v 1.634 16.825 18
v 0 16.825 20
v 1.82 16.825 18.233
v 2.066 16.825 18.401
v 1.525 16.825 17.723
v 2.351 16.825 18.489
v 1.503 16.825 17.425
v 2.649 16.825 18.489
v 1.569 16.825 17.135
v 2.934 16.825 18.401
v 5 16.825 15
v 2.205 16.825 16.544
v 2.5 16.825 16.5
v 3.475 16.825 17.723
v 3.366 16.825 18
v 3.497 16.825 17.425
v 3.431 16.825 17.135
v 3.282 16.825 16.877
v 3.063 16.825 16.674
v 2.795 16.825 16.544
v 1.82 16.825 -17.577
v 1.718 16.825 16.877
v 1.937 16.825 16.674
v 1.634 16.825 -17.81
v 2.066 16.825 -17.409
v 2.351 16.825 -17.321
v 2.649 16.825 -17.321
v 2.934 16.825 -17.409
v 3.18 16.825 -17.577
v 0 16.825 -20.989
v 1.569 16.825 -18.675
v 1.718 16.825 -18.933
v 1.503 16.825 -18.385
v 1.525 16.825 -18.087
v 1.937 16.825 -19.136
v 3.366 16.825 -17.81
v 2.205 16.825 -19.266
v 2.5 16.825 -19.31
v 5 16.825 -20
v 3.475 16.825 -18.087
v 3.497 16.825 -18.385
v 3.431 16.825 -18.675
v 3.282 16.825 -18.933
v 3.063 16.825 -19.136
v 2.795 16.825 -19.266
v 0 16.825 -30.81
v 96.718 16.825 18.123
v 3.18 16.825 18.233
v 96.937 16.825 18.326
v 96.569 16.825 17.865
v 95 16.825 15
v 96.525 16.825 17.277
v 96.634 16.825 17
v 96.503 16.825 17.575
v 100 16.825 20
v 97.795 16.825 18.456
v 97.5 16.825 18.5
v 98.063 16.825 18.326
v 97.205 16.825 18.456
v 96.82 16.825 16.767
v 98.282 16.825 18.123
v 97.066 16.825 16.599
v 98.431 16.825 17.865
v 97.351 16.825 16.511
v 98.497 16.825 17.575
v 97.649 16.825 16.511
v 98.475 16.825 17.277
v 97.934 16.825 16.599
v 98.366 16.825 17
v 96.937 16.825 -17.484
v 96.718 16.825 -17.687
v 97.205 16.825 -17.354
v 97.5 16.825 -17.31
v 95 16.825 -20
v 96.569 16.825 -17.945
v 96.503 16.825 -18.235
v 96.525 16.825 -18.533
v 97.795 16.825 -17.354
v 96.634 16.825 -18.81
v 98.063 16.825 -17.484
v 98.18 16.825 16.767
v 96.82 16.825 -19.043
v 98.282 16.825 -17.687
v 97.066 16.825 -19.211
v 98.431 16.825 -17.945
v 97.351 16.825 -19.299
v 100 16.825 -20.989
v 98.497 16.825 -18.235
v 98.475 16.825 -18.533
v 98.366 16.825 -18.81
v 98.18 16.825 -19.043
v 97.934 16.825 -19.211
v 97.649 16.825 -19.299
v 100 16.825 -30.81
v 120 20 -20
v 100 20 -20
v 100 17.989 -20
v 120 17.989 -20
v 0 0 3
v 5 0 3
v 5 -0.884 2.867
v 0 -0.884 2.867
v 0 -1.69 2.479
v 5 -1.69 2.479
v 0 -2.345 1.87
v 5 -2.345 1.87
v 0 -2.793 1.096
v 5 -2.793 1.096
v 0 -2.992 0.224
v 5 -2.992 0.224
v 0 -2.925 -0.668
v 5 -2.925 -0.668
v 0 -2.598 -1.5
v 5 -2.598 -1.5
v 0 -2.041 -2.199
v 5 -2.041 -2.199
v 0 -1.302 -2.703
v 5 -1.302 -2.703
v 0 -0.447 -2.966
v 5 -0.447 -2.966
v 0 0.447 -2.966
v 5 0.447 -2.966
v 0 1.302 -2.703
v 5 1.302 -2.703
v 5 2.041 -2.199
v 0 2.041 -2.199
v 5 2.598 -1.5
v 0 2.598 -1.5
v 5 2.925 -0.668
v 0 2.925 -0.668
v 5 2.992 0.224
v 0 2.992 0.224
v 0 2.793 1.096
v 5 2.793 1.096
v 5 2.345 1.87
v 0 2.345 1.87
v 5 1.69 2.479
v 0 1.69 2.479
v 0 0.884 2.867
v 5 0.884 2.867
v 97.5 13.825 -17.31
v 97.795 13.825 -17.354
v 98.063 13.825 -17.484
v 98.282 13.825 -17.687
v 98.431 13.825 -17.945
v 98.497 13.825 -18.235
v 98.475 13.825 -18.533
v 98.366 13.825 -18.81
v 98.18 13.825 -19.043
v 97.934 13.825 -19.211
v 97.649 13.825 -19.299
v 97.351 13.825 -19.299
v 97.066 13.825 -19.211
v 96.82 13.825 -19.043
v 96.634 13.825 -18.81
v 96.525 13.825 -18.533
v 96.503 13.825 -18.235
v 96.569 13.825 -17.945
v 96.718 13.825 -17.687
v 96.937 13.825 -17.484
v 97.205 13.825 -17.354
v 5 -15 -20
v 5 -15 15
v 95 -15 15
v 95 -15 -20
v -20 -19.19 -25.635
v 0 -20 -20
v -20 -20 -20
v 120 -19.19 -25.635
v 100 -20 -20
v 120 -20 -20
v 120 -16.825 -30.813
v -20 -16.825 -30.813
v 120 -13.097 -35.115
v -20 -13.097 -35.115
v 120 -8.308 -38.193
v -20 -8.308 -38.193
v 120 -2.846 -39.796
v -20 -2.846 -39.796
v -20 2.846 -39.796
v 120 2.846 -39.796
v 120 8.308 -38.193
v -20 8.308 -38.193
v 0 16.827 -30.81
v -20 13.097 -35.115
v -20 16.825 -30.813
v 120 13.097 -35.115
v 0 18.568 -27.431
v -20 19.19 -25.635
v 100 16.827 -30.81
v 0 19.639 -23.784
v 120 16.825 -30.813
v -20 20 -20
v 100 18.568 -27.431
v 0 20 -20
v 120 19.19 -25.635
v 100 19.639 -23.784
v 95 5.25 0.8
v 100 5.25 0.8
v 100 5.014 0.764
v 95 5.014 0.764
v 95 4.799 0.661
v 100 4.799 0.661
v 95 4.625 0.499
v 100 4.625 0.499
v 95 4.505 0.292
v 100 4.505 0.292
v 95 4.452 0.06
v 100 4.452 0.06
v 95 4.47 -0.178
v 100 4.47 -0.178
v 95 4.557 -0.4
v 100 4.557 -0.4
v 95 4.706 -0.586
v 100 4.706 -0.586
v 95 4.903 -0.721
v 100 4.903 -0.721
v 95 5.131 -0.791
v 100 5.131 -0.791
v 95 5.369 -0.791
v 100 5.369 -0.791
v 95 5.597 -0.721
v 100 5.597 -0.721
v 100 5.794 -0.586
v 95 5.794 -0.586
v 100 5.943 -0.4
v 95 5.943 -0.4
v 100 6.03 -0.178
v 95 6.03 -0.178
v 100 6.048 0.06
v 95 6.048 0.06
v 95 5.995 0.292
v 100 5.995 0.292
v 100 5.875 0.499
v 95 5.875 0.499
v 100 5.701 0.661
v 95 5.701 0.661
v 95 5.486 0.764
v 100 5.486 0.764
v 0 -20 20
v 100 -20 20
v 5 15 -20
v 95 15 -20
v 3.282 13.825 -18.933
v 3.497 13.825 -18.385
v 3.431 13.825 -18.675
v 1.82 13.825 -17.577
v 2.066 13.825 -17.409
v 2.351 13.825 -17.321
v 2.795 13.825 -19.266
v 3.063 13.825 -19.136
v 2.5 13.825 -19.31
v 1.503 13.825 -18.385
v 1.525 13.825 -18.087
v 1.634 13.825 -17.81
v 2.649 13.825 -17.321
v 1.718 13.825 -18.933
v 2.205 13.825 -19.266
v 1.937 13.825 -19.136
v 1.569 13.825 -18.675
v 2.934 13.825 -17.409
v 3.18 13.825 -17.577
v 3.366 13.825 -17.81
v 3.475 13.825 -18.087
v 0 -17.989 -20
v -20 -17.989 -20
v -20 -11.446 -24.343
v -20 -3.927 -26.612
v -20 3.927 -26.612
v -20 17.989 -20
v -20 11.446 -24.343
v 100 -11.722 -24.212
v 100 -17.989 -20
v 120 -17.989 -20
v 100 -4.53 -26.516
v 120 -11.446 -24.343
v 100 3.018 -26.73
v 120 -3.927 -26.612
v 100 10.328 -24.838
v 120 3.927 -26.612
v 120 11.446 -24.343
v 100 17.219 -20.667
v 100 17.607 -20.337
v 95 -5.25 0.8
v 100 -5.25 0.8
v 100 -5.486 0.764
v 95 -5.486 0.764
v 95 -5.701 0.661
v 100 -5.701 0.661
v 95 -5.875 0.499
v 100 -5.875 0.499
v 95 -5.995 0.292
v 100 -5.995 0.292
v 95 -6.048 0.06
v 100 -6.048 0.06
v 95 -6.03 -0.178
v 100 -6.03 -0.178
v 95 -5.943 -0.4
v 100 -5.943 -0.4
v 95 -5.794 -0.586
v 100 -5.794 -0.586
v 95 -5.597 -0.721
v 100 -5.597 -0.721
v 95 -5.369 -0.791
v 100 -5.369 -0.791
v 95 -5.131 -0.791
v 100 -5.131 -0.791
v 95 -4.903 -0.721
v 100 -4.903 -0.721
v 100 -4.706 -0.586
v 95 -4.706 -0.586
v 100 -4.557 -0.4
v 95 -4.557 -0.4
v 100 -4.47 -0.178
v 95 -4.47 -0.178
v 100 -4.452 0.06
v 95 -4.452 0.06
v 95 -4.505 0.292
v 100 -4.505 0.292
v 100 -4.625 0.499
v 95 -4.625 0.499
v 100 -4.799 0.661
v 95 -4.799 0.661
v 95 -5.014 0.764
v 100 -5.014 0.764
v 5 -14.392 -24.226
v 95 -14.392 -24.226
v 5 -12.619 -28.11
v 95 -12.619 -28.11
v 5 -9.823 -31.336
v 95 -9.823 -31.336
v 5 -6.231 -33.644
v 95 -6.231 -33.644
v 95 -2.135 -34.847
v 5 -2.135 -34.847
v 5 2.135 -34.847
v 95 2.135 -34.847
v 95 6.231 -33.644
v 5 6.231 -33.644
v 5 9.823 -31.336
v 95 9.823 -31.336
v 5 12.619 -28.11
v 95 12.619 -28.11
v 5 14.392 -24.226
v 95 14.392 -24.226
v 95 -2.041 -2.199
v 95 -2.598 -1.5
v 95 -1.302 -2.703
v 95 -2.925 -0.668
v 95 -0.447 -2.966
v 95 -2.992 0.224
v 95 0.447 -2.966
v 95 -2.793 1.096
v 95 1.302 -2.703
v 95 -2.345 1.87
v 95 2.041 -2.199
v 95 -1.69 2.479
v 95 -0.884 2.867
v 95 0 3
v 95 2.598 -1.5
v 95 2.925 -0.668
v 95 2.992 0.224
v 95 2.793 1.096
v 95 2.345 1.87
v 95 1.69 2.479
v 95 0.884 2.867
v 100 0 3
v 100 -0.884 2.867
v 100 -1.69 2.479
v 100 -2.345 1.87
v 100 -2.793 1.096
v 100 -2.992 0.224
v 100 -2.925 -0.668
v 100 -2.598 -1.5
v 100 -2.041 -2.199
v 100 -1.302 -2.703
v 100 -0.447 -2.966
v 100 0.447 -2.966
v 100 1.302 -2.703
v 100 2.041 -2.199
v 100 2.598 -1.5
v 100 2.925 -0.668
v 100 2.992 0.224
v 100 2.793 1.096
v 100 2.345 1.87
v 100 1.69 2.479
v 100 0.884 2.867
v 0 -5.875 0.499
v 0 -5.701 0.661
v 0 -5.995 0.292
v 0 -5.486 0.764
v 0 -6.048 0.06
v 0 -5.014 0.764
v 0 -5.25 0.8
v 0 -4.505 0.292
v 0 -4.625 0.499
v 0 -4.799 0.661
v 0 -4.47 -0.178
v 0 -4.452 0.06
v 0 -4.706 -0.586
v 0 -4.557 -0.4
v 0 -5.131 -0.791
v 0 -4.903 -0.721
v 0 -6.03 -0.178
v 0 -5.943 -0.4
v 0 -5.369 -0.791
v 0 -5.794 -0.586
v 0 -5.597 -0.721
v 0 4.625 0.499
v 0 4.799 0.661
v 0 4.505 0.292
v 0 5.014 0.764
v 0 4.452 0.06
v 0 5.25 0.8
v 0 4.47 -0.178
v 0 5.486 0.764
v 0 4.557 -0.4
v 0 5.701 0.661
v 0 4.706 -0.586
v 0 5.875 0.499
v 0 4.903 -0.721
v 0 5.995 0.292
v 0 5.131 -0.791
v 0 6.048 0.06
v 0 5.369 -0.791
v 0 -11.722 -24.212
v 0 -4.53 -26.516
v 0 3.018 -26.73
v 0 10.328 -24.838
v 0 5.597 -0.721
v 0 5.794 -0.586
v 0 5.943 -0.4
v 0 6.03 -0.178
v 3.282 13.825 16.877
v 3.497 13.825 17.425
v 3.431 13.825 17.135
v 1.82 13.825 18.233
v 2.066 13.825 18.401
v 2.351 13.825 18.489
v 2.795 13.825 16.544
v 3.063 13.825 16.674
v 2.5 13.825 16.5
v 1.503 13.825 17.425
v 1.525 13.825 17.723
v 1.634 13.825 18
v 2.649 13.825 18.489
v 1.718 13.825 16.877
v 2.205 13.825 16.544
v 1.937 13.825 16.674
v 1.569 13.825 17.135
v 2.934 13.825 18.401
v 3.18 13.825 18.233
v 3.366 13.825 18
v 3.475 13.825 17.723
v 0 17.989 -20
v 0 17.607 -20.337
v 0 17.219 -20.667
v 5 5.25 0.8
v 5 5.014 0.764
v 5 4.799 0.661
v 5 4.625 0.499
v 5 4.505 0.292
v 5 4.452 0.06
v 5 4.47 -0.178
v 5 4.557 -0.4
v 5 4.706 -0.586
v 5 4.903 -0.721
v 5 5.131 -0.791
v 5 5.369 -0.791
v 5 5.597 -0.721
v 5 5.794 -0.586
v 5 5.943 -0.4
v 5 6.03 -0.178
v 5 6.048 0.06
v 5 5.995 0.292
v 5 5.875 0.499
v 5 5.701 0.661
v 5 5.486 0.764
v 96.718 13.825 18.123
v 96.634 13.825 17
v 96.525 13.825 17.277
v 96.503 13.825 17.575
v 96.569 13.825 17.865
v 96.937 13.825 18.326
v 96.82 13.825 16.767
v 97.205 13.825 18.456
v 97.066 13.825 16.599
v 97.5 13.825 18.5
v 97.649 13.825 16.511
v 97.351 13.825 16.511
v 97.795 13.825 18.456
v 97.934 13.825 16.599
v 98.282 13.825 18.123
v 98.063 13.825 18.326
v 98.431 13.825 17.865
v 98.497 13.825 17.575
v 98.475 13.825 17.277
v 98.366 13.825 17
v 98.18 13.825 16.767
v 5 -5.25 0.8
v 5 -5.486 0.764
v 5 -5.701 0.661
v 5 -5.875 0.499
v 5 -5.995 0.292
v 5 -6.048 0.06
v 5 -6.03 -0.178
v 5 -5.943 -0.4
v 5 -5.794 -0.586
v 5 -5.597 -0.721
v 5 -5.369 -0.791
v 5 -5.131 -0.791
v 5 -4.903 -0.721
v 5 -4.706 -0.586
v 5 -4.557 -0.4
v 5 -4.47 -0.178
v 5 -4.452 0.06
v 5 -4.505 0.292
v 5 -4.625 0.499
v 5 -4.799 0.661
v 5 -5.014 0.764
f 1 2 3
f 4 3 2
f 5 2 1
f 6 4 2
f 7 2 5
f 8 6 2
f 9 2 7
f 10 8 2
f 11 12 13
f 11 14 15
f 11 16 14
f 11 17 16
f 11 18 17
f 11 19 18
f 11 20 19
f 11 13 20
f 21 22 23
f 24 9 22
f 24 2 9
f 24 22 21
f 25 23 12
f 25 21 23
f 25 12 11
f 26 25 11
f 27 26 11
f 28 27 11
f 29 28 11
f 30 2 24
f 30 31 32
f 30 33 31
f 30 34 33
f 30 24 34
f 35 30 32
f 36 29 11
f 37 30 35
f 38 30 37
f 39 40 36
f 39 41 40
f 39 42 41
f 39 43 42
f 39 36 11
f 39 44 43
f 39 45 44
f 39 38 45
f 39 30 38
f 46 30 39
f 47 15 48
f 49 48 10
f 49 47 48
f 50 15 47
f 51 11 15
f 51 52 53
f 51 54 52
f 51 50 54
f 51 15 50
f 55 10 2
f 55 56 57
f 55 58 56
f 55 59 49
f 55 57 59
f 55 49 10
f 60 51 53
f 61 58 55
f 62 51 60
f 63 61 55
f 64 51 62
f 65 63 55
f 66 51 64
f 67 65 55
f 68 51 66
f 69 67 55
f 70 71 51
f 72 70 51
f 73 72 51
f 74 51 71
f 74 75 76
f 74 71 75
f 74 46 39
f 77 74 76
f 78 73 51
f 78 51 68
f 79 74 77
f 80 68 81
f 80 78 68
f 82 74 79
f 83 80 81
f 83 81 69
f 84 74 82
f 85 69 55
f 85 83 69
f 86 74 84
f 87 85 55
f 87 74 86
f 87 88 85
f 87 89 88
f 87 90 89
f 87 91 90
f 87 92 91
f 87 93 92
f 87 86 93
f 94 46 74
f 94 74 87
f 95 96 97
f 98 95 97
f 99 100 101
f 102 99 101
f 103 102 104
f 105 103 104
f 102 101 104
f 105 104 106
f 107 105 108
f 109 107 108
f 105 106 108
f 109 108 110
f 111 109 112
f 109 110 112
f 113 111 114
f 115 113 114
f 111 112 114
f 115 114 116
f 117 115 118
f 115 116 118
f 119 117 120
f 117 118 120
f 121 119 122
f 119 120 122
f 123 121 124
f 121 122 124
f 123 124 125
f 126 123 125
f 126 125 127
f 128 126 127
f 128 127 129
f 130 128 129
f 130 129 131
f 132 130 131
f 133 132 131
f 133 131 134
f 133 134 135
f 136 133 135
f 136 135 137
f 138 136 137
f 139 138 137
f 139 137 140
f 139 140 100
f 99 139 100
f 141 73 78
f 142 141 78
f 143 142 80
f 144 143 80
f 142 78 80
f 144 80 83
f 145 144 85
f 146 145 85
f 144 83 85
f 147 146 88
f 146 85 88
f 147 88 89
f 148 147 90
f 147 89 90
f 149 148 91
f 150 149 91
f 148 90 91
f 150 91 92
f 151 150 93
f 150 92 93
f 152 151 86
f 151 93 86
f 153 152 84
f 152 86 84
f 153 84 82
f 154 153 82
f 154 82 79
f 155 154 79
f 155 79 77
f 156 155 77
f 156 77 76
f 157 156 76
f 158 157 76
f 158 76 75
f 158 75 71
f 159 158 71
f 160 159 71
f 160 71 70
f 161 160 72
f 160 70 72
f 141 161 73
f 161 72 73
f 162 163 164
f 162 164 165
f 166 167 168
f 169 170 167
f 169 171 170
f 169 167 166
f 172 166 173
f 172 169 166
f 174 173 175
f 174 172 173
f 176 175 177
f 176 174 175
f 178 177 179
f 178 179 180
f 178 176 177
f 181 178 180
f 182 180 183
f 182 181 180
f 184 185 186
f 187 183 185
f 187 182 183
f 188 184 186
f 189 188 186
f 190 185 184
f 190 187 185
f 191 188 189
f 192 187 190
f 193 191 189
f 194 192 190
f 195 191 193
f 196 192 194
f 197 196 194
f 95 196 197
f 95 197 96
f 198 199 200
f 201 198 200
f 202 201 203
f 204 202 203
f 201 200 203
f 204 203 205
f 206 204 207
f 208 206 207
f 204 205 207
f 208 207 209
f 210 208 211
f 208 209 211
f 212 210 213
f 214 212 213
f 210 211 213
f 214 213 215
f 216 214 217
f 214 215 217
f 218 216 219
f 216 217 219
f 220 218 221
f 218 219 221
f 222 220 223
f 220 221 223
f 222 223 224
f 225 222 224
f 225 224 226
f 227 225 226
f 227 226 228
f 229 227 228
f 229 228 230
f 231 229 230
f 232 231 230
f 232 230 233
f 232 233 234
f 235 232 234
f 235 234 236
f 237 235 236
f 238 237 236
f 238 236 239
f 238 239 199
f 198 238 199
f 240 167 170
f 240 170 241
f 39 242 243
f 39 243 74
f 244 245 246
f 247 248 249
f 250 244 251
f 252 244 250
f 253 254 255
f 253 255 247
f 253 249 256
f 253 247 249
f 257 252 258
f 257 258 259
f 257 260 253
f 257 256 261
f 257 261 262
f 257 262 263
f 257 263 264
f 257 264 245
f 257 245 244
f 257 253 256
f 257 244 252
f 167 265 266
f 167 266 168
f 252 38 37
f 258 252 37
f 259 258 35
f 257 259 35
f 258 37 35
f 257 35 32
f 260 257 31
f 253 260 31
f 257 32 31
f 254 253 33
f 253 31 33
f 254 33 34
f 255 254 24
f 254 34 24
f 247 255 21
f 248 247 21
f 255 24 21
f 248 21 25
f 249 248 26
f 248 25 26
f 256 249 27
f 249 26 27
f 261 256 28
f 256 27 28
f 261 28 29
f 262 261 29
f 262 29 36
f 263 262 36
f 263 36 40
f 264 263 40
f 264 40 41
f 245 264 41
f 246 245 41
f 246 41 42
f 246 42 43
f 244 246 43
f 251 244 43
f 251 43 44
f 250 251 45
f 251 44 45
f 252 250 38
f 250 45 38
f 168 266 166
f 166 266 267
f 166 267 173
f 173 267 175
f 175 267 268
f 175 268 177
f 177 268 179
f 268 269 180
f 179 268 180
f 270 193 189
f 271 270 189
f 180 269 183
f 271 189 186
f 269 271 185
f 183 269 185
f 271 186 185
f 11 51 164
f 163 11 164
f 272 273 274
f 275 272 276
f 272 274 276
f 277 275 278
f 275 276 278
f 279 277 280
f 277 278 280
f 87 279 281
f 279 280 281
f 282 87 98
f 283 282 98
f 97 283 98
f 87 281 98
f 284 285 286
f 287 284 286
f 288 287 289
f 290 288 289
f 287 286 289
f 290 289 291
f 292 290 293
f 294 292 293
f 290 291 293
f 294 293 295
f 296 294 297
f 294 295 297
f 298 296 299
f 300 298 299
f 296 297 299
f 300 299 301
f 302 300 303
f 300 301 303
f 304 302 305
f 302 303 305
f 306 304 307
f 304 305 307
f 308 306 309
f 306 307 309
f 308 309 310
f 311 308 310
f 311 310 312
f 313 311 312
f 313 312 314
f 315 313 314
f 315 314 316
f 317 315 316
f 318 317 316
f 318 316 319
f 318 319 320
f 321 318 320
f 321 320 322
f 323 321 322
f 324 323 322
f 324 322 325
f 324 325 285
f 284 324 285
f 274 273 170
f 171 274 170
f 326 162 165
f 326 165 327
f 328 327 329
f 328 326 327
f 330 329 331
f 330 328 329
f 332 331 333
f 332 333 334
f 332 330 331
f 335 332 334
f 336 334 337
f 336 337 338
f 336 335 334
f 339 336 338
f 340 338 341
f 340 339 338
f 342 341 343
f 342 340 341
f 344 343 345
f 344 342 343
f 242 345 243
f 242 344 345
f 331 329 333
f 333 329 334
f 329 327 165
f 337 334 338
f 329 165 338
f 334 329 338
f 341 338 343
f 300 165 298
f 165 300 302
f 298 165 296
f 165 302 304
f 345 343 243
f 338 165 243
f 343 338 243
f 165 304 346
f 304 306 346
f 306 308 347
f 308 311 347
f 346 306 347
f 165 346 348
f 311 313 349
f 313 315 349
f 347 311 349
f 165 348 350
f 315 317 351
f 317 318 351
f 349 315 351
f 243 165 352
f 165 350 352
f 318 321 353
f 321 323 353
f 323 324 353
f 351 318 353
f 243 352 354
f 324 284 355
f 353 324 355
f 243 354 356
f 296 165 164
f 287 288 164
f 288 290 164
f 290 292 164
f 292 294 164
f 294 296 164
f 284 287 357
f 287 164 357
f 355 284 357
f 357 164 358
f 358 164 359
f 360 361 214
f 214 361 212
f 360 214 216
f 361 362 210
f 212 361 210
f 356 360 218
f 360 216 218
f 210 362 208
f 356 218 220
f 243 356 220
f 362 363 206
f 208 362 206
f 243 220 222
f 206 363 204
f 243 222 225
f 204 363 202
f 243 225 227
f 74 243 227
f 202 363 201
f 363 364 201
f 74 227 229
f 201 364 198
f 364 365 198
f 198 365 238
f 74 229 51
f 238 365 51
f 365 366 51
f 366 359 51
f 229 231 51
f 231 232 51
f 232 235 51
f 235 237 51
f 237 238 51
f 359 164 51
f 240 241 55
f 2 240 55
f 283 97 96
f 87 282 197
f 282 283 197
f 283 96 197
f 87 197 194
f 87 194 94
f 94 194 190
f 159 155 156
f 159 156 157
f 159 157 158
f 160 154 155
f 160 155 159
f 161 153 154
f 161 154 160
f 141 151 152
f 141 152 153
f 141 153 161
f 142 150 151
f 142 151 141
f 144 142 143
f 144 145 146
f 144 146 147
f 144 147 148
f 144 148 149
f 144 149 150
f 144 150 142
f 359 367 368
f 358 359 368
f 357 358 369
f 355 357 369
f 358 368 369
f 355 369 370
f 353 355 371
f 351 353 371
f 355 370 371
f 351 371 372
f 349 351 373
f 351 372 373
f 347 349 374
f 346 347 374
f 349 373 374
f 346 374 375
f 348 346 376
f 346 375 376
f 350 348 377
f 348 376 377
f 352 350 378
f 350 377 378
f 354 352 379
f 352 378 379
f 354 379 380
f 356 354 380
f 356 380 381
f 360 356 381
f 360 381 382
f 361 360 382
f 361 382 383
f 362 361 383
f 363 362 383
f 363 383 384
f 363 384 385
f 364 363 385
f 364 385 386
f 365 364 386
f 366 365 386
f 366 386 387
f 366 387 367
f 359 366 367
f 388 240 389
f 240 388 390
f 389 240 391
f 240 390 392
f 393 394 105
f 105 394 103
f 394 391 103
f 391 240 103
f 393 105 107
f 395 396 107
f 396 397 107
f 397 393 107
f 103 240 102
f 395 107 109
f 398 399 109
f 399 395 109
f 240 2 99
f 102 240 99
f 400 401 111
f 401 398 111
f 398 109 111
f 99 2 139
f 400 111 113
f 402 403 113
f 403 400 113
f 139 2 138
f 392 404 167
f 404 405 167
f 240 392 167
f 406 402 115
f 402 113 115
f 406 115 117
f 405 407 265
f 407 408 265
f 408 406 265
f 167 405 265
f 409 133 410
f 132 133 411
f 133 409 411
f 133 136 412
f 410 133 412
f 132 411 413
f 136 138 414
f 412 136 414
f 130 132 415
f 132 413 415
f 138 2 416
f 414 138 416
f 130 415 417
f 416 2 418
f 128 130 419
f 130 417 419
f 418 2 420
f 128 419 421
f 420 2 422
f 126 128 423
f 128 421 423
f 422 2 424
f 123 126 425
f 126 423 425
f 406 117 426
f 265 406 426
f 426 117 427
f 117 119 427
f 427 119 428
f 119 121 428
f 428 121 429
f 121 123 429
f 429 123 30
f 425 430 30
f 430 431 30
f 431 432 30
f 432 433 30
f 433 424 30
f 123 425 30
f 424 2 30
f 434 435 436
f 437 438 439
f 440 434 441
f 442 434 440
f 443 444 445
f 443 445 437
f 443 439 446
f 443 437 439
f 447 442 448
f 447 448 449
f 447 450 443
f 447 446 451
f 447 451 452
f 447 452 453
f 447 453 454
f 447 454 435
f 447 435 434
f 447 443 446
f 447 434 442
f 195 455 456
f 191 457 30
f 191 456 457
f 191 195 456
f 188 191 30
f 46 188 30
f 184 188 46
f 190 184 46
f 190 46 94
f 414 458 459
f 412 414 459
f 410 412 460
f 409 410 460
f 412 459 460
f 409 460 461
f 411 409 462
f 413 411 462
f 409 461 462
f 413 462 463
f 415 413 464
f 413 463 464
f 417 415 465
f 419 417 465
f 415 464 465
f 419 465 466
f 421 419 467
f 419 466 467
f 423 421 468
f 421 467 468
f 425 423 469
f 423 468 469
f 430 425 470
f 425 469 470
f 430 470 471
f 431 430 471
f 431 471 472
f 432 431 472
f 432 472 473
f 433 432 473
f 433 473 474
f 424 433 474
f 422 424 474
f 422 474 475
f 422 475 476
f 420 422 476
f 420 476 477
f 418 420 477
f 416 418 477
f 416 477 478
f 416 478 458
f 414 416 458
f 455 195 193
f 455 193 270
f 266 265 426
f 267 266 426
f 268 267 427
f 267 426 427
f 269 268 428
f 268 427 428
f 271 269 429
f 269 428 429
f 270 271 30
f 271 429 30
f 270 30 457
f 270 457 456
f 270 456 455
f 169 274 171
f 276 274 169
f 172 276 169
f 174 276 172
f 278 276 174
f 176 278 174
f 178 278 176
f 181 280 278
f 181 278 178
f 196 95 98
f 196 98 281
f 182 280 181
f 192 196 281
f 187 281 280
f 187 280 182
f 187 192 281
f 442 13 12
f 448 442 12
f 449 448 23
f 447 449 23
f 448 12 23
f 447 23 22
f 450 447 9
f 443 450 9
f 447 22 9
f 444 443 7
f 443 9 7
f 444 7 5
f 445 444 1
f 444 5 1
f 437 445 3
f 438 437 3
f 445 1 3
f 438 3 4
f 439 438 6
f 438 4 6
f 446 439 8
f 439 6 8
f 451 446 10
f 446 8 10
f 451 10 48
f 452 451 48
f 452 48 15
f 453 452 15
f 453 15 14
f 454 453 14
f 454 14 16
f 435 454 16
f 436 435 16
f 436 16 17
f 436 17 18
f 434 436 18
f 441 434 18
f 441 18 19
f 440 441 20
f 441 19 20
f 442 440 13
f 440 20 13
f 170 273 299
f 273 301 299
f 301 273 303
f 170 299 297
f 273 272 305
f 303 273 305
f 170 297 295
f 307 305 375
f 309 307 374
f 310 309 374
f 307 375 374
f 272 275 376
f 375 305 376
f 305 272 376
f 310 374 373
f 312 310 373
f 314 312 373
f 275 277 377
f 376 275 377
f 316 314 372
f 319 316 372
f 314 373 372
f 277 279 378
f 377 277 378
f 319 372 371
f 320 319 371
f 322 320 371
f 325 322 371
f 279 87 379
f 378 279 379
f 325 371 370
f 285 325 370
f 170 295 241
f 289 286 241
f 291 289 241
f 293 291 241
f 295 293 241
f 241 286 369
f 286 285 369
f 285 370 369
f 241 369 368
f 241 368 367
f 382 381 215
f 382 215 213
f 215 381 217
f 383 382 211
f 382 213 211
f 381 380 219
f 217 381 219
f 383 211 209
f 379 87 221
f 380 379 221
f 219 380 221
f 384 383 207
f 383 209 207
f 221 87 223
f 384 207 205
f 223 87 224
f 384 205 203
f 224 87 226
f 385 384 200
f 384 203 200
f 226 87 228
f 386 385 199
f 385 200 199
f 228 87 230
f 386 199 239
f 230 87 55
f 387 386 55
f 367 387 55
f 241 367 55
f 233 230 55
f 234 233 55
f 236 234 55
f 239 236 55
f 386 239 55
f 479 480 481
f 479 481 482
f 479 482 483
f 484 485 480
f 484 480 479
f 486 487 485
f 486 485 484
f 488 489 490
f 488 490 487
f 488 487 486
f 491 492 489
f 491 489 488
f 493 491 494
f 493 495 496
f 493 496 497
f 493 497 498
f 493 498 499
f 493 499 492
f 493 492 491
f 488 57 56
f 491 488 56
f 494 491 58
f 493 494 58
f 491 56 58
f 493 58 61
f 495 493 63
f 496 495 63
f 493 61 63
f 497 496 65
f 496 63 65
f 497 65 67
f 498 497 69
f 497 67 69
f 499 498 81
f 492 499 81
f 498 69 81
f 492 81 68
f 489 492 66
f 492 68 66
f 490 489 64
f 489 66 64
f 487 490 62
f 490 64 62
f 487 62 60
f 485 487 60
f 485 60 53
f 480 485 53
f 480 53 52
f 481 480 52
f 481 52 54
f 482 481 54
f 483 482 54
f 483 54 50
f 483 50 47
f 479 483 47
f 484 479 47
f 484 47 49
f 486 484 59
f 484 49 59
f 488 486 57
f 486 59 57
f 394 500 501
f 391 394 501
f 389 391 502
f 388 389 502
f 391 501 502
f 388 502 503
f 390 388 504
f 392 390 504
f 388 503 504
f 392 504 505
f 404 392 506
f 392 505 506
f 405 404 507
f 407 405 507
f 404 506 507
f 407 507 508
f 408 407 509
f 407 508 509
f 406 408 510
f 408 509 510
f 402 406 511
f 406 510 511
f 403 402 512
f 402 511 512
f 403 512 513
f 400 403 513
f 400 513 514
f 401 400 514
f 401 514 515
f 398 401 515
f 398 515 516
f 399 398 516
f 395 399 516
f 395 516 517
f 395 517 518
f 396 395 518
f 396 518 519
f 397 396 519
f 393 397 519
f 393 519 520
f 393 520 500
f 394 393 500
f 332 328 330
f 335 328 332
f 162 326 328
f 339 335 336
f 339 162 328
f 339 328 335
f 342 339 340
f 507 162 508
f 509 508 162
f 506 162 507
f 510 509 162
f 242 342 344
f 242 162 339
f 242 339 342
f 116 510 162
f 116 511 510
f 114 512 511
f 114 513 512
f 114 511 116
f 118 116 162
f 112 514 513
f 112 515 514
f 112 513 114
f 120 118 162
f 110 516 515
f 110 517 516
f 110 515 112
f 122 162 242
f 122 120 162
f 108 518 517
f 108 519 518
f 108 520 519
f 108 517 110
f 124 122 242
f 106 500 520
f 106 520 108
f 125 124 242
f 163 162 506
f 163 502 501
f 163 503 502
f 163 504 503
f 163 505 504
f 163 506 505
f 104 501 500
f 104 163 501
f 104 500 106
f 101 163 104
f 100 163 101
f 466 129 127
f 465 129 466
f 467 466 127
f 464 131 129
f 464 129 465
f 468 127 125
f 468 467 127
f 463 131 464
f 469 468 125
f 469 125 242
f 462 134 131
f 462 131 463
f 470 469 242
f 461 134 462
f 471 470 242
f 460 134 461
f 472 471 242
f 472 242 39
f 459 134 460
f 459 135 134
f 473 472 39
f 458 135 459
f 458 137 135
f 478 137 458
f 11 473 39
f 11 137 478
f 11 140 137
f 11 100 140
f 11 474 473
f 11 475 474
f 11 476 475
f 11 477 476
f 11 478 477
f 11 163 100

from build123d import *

# Parameters (mm, degrees)
BOSS_EXTRUDE1_DEPTH = 100
SHELL3_START        = 5
SHELL3_DEPTH        = 90
BOSS_EXTRUDE2_DEPTH = 20
SKETCH7_W           = 100
SKETCH7_H           = 50.81
CUT_EXTRUDE6_DEPTH  = 3.175
CUT_EXTRUDE1_REACH  = 130.062
SKETCH2_R           = 0.8
SKETCH2_R_2         = 3
SKETCH8_R           = 1
CUT_EXTRUDE7_DEPTH  = 3
CUT_EXTRUDE8_DEPTH  = 20
CUT_EXTRUDE9_START  = -20
CUT_EXTRUDE9_DEPTH  = 20


# Read off the part's stored shape, not the designer's step: Shell3
with BuildPart() as part:
    # Sketch1 → Boss-Extrude1 (new body)
    with BuildSketch(Plane(origin=(0, 0, 0), x_dir=(0, 0, -1), z_dir=(1, 0, 0))):
        with BuildLine():
            Line((-20, 20), (20, 20))
            ThreePointArc((20, 20), (40, 0), (20, -20))
            Line((20, -20), (-20, -20))
            Line((-20, -20), (-20, 20))
        make_face()
    extrude(amount=BOSS_EXTRUDE1_DEPTH)

    # Shell3 outline → Shell3 (cut)
    with BuildSketch(Plane.YZ.offset(SHELL3_START)):
        with BuildLine():
            Line((15, -20), (20, -20))
            Line((20, -20), (20, 15))
            Line((20, 15), (-15, 15))
            Line((-15, 15), (-15, -20))
            ThreePointArc((-15, -20), (0, -35), (15, -20))
        make_face()
    extrude(amount=SHELL3_DEPTH, mode=Mode.SUBTRACT)

    # Sketch9 → Boss-Extrude2 (add)
    with BuildSketch(Plane(origin=(100, 0, 0), x_dir=(0, 0, -1), z_dir=(1, 0, 0))):
        with BuildLine():
            Line((20, 20), (20, -20))
            ThreePointArc((20, -20), (40, 0), (20, 20))
        make_face()
    boss_extrude2 = extrude(amount=BOSS_EXTRUDE2_DEPTH)

    # Mirror1: Boss-Extrude2 across plane
    add(boss_extrude2.mirror(Plane(origin=(50, 0, 0), x_dir=(0, 0, 1), z_dir=(1, 0, 0))))

    # Sketch7 → Cut-Extrude6 (cut)
    with BuildSketch(Plane(origin=(0, 20, 0), x_dir=(1, 0, 0), z_dir=(0, 1, 0))):
        with Locations((50, 5.405)):
            Rectangle(SKETCH7_W, SKETCH7_H)
    extrude(amount=-CUT_EXTRUDE6_DEPTH, mode=Mode.SUBTRACT)

    # Cut-Extrude1: up to this face of the body (flat: up to its plane)
    cut_extrude1_end = Plane(part.part.faces().sort_by_distance((0, -1.5875, 0))[0])
    # Sketch2 → Cut-Extrude1 (cut, up to the picked face)
    with BuildSketch(Plane(origin=(100, 0, 0), x_dir=(0, 0, -1), z_dir=(1, 0, 0)), mode=Mode.PRIVATE) as cut_extrude1_sk1:
        with Locations(Location((0, -5.25, 0), (0, 0, 180))):
            Circle(SKETCH2_R)
    cut_extrude1_tool1 = split(extrude(cut_extrude1_sk1.sketch, amount=-CUT_EXTRUDE1_REACH, mode=Mode.PRIVATE), bisect_by=cut_extrude1_end, keep=Keep.BOTH, mode=Mode.PRIVATE)
    # Sketch2 → Cut-Extrude1 (cut, up to the picked face)
    with BuildSketch(Plane(origin=(100, 0, 0), x_dir=(0, 0, -1), z_dir=(1, 0, 0)), mode=Mode.PRIVATE) as cut_extrude1_sk2:
        with Locations(Location((0, 0, 0), (0, 0, 180))):
            Circle(SKETCH2_R_2)
    cut_extrude1_tool2 = split(extrude(cut_extrude1_sk2.sketch, amount=-CUT_EXTRUDE1_REACH, mode=Mode.PRIVATE), bisect_by=cut_extrude1_end, keep=Keep.BOTH, mode=Mode.PRIVATE)
    # Sketch2 → Cut-Extrude1 (cut, up to the picked face)
    with BuildSketch(Plane(origin=(100, 0, 0), x_dir=(0, 0, -1), z_dir=(1, 0, 0)), mode=Mode.PRIVATE) as cut_extrude1_sk3:
        with Locations(Location((0, 5.25, 0), (0, 0, 180))):
            Circle(SKETCH2_R)
    cut_extrude1_tool3 = split(extrude(cut_extrude1_sk3.sketch, amount=-CUT_EXTRUDE1_REACH, mode=Mode.PRIVATE), bisect_by=cut_extrude1_end, keep=Keep.BOTH, mode=Mode.PRIVATE)
    add(cut_extrude1_tool1.solids().sort_by(Axis((100, -5.25, 0), (-1, 0, 0)))[0], mode=Mode.SUBTRACT)
    add(cut_extrude1_tool2.solids().sort_by(Axis((100, 0, 0), (-1, 0, 0)))[0], mode=Mode.SUBTRACT)
    add(cut_extrude1_tool3.solids().sort_by(Axis((100, 5.25, 0), (-1, 0, 0)))[0], mode=Mode.SUBTRACT)

    # Sketch8 → Cut-Extrude7 (cut)
    with BuildSketch(Plane(origin=(0, 16.825, 0), x_dir=(1, 0, 0), z_dir=(0, 1, 0))):
        with Locations(Location((97.5, -17.5, 0), (0, 0, 270))):
            Circle(SKETCH8_R)
        with Locations(Location((97.5, 18.31, 0), (0, 0, 270))):
            Circle(SKETCH8_R)
        with Locations(Location((2.5, -17.5, 0), (0, 0, 90))):
            Circle(SKETCH8_R)
        with Locations(Location((2.5, 18.31, 0), (0, 0, 90))):
            Circle(SKETCH8_R)
    extrude(amount=-CUT_EXTRUDE7_DEPTH, mode=Mode.SUBTRACT)

    # Sketch10 → Cut-Extrude8 (cut)
    with BuildSketch(Plane(origin=(120, 0, 0), x_dir=(0, 0, -1), z_dir=(1, 0, 0))):
        with BuildLine():
            Line((20, 17.989163405), (20, -17.989163405))
            ThreePointArc((20, -17.989163405), (26.9, 0), (20, 17.989163405))
        make_face()
    extrude(amount=-CUT_EXTRUDE8_DEPTH, mode=Mode.SUBTRACT)

    # Sketch11 → Cut-Extrude9 (cut)
    with BuildSketch(Plane.ZY.offset(20).offset(CUT_EXTRUDE9_START)):
        with BuildLine():
            Line((-20, 17.989163405), (-20, -17.989163405))
            ThreePointArc((-20, -17.989163405), (-26.9, 0), (-20, 17.989163405))
        make_face()
    extrude(amount=CUT_EXTRUDE9_DEPTH, mode=Mode.SUBTRACT)


solid = part.part
